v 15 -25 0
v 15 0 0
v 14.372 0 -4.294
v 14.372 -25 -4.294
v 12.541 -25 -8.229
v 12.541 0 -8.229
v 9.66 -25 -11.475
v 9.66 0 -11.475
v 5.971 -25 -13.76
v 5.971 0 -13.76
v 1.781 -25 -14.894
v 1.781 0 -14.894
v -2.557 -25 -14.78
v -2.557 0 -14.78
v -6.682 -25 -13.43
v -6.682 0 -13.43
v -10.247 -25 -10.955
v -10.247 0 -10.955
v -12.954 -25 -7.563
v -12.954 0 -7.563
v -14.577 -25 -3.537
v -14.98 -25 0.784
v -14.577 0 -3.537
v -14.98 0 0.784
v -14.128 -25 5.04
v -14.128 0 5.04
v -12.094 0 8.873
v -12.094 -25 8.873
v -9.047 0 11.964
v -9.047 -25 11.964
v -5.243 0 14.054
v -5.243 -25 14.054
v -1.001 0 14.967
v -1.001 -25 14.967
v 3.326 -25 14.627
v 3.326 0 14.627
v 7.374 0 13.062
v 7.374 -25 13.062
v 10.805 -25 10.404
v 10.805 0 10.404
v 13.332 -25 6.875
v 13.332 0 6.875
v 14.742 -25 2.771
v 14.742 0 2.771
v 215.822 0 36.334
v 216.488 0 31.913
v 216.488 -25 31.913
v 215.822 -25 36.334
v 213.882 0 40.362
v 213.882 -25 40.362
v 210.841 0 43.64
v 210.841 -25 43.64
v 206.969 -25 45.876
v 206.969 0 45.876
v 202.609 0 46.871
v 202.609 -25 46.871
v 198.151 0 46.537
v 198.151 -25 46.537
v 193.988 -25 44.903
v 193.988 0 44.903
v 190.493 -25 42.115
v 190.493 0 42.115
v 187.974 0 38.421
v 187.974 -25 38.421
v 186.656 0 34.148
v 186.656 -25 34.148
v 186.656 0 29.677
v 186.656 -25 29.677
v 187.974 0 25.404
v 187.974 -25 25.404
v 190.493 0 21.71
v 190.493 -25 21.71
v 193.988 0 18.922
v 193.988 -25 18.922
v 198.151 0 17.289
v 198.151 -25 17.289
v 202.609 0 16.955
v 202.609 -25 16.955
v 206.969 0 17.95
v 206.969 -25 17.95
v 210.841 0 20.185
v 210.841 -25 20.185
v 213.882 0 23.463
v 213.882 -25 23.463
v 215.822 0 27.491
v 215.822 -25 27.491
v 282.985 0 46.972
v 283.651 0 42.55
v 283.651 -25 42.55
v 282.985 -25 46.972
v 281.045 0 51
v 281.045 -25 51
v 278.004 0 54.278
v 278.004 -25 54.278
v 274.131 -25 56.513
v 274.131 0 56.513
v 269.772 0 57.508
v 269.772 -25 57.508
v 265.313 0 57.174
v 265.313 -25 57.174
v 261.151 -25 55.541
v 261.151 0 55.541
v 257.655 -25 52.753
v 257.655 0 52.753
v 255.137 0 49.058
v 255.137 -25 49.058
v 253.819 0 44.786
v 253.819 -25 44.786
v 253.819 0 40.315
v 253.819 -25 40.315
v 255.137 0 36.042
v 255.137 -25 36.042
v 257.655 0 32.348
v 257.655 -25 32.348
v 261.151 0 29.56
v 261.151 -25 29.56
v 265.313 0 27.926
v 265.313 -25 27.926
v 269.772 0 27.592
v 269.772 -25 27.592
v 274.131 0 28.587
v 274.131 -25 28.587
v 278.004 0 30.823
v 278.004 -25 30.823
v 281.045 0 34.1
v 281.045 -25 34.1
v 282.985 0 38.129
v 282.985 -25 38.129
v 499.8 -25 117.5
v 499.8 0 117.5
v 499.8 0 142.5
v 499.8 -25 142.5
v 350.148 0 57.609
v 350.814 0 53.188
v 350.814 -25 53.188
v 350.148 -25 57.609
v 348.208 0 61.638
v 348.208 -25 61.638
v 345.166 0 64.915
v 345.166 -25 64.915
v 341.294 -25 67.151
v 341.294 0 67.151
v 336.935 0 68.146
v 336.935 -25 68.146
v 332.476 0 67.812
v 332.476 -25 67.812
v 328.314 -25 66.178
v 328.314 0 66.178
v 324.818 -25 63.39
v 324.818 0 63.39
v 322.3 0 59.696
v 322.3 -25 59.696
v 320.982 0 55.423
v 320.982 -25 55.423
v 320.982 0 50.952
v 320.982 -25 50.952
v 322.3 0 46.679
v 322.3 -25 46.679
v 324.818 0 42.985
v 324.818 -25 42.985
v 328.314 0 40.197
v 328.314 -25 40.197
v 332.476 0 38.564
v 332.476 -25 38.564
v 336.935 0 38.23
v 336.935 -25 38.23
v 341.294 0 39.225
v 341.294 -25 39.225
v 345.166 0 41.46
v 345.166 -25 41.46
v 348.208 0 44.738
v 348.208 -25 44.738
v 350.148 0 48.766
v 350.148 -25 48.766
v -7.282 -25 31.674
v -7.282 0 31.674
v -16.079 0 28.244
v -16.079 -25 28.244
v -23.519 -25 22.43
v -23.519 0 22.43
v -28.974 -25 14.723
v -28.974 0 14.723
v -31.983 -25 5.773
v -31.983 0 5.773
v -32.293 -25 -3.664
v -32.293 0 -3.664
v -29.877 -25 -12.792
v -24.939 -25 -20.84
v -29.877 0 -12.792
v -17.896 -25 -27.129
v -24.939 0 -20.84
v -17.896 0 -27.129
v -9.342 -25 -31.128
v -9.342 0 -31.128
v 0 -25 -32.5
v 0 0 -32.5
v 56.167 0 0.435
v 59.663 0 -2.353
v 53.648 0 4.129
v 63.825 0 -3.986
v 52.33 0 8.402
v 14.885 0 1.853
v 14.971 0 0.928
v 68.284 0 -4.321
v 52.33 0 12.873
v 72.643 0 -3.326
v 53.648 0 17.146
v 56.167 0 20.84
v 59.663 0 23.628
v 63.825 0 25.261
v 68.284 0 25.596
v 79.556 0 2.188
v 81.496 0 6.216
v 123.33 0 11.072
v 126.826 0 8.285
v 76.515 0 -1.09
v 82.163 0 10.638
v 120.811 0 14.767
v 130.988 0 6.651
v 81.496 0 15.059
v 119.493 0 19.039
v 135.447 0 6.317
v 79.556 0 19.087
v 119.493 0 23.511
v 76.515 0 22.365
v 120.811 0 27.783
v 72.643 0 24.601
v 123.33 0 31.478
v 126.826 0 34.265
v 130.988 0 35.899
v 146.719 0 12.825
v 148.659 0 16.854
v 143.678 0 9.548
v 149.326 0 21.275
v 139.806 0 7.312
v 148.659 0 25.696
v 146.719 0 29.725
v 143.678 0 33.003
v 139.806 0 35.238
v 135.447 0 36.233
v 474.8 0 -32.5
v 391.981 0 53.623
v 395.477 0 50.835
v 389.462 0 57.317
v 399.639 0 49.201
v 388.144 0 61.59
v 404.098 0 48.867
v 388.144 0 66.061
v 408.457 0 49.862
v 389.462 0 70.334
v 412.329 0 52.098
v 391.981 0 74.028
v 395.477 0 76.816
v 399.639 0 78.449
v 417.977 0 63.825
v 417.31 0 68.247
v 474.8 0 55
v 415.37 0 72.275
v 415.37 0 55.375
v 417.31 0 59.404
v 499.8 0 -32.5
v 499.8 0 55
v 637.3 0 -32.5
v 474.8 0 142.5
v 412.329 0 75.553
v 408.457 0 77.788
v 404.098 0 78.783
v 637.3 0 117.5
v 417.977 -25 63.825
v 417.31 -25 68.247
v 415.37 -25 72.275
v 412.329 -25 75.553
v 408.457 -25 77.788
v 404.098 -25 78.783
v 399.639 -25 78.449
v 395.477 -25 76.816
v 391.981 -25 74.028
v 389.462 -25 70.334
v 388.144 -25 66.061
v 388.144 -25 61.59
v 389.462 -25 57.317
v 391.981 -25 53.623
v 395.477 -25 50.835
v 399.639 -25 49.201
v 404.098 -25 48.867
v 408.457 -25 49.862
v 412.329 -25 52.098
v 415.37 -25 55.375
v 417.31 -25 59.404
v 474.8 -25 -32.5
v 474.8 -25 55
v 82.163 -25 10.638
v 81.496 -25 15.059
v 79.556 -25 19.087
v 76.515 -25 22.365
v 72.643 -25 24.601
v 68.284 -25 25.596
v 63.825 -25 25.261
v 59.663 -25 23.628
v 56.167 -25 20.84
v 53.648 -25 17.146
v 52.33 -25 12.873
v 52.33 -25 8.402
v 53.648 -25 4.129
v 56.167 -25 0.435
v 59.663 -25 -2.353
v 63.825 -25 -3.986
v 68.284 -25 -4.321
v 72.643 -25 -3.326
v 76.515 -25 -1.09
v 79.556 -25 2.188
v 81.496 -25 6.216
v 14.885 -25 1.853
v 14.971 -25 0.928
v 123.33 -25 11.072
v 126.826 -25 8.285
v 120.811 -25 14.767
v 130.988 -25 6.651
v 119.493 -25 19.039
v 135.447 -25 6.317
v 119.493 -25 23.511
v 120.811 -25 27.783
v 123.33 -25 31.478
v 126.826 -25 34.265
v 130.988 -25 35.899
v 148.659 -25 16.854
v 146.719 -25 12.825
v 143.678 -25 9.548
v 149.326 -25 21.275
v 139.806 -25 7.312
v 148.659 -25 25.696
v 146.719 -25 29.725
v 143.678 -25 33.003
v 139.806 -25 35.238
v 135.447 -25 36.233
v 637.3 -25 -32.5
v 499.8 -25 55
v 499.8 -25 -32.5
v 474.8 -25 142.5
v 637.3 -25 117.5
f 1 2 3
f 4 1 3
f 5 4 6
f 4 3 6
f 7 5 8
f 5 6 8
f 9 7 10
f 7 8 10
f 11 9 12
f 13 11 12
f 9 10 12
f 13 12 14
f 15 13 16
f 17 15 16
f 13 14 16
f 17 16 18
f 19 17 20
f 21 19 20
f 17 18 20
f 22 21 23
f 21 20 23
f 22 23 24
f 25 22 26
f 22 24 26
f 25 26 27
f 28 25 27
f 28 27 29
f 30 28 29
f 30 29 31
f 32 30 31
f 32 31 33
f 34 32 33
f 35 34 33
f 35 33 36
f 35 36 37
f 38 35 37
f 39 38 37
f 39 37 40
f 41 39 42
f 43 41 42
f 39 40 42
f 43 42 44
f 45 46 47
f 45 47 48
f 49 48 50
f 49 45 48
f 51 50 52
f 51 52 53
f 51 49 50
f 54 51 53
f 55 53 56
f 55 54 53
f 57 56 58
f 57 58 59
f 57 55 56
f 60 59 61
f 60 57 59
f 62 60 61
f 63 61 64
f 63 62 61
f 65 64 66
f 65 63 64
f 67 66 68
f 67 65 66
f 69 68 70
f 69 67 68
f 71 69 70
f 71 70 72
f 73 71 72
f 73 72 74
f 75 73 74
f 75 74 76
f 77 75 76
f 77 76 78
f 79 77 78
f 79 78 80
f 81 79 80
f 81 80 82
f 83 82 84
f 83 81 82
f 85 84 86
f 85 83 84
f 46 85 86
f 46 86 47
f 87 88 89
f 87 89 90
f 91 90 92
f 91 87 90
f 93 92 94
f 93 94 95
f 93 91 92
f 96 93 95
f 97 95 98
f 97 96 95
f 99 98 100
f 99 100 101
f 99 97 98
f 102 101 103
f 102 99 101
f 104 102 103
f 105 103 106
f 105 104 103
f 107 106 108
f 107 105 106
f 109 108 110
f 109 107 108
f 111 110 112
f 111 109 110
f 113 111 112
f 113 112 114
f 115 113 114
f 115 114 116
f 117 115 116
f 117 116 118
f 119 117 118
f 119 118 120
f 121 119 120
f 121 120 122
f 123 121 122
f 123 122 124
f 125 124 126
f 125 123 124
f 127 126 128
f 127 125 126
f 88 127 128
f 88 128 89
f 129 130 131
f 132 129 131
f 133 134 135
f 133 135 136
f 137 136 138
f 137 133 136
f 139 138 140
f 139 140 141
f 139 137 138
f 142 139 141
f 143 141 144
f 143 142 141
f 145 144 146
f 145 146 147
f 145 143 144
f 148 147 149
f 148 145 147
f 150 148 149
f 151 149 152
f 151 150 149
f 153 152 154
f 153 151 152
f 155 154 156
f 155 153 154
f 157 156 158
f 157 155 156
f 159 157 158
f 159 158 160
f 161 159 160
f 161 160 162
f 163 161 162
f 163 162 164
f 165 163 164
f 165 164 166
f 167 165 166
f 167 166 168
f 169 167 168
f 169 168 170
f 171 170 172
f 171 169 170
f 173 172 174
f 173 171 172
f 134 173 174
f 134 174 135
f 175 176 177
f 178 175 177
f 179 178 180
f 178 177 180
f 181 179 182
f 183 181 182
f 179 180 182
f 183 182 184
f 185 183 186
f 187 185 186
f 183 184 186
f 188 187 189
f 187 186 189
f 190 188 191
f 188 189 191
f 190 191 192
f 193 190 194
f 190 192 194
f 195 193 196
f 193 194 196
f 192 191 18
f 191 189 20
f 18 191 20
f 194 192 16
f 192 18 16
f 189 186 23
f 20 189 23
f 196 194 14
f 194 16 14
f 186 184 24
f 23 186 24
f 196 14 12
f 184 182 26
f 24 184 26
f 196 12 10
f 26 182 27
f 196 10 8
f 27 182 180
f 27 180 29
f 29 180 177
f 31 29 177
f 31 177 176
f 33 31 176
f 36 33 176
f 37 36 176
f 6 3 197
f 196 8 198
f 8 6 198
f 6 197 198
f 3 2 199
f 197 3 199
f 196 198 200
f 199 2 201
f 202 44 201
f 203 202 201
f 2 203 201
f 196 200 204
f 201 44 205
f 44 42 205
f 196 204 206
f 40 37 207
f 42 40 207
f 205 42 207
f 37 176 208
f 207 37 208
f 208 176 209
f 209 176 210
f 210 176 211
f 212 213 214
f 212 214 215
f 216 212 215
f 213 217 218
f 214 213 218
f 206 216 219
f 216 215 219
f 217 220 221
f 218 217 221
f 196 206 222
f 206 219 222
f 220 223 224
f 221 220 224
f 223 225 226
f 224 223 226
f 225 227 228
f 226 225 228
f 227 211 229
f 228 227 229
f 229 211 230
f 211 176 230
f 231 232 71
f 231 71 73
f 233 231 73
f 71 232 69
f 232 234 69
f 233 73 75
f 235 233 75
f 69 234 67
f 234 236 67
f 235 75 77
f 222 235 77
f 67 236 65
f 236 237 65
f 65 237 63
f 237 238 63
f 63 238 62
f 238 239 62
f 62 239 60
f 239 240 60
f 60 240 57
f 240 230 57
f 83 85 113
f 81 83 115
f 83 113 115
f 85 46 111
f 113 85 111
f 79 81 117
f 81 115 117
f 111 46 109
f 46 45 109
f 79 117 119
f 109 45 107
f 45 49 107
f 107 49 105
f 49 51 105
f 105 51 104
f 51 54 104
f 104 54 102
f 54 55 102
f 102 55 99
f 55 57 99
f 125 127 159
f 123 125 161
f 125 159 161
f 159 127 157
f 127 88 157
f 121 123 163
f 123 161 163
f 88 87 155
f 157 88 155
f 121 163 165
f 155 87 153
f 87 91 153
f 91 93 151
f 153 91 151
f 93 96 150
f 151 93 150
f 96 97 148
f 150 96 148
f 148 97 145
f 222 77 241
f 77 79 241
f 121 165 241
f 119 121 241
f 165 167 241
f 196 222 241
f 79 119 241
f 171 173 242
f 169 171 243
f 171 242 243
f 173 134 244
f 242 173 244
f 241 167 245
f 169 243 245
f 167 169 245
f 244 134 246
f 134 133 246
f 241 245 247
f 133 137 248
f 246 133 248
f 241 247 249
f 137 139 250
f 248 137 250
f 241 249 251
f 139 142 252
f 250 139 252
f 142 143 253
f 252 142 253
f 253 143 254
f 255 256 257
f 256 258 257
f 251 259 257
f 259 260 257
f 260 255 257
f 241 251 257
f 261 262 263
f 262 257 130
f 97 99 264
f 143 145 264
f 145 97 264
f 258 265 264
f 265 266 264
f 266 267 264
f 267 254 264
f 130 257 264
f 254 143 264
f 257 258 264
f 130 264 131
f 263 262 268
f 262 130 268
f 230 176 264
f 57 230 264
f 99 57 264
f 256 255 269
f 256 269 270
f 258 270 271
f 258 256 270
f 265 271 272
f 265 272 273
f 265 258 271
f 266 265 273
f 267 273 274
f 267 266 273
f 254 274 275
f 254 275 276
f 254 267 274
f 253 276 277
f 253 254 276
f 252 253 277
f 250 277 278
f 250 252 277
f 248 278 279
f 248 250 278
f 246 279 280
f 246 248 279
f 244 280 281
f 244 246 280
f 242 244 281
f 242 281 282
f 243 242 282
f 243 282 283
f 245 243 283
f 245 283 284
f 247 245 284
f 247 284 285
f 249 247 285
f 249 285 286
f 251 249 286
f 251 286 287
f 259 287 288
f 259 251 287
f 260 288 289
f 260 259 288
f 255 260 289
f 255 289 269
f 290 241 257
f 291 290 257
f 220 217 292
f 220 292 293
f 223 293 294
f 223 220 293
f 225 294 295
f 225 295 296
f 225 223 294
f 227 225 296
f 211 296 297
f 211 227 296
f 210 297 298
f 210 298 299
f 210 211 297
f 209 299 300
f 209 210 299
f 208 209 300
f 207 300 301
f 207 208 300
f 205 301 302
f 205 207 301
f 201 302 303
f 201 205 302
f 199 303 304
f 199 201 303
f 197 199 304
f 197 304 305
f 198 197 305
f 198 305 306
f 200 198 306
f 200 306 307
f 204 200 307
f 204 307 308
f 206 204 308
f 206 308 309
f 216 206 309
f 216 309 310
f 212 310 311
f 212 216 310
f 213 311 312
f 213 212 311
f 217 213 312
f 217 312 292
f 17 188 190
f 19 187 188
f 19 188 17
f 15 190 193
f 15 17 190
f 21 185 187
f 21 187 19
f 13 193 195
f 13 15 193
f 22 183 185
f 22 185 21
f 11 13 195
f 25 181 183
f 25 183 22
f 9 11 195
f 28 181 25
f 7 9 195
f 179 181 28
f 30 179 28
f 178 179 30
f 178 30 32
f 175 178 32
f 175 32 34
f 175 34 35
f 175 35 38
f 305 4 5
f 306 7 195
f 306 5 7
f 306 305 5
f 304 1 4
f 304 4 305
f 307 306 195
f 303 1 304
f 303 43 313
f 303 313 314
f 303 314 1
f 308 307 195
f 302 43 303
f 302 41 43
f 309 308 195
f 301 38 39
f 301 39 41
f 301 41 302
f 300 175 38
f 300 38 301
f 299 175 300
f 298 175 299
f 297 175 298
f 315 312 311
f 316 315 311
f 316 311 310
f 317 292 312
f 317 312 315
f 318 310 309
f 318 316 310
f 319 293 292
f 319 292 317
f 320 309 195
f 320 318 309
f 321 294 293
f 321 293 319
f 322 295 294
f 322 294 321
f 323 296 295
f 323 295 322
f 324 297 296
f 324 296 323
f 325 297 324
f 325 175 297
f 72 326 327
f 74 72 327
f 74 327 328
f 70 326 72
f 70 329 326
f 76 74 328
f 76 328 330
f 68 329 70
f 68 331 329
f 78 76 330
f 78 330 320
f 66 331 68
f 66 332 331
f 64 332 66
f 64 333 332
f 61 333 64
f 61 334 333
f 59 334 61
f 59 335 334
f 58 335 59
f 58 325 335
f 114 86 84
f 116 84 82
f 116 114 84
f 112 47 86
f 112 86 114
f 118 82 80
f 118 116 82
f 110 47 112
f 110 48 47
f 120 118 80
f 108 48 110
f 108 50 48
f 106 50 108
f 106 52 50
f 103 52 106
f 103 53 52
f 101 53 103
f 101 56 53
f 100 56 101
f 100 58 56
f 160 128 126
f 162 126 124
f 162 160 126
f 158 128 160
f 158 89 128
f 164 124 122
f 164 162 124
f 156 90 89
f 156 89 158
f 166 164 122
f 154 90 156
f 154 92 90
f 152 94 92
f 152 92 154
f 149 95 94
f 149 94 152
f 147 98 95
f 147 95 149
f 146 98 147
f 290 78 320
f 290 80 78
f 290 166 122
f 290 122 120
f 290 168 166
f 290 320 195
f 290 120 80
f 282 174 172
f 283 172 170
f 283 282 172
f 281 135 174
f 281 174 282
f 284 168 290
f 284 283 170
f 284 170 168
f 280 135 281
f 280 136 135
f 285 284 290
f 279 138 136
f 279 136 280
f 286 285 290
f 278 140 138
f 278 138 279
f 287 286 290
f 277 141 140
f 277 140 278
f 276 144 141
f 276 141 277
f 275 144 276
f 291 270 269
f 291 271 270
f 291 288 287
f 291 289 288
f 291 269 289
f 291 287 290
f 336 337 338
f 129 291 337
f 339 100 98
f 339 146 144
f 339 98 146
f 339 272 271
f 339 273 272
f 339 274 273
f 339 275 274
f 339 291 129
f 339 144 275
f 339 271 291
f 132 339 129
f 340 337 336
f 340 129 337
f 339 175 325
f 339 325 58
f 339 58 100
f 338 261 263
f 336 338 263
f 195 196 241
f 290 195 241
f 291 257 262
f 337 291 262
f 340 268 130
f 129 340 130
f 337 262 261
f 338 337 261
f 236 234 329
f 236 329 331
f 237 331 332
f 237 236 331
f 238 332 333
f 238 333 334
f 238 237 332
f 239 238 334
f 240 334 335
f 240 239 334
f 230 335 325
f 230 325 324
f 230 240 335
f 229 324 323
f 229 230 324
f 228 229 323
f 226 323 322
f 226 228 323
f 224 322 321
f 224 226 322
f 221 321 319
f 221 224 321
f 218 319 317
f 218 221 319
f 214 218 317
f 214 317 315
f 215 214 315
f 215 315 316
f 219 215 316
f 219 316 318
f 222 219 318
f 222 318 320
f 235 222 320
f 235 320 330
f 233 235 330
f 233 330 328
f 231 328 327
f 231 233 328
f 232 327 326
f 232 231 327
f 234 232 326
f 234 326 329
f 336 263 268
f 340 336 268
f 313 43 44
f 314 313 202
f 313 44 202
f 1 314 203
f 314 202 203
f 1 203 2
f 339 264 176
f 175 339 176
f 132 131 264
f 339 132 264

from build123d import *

# Parameters (mm, degrees)
F0_R     = 15
F1_DEPTH = 25


with BuildPart() as f1:
    # F0 (on Front) → F1 (new body)
    with BuildSketch(Plane.XZ):
        with BuildLine():
            Line((474.8, 142.5), (-7.281521, 31.673798))
            ThreePointArc((-7.281521, 31.673798), (-32.292789, -3.664122), (0, -32.5))
            Line((0, -32.5), (474.8, -32.5))
            Line((474.8, -32.5), (474.8, 55))
            Line((474.8, 55), (499.8, 55))
            Line((499.8, 55), (499.8, -32.5))
            Line((499.8, -32.5), (637.3, -32.5))
            Line((637.3, -32.5), (637.3, 117.5))
            Line((637.3, 117.5), (499.8, 117.5))
            Line((499.8, 117.5), (499.8, 142.5))
            Line((499.8, 142.5), (474.8, 142.5))
        make_face()
        with BuildLine():
            ThreePointArc((14.741868, 2.770801), (14.935328, 1.391399), (15, 0))
            ThreePointArc((15, 0), (-14.935328, -1.391399), (14.741868, 2.770801))
        make_face(mode=Mode.SUBTRACT)
        with Locations((67.162807, 10.637544)):
            Circle(F0_R, mode=Mode.SUBTRACT)
        with Locations((134.325614, 21.275087)):
            Circle(F0_R, mode=Mode.SUBTRACT)
        with Locations((201.488421, 31.912631)):
            Circle(F0_R, mode=Mode.SUBTRACT)
        with Locations((268.651229, 42.550174)):
            Circle(F0_R, mode=Mode.SUBTRACT)
        with Locations((335.814036, 53.187718)):
            Circle(F0_R, mode=Mode.SUBTRACT)
        with Locations((402.976843, 63.825262)):
            Circle(F0_R, mode=Mode.SUBTRACT)
    extrude(amount=F1_DEPTH)


solid = f1.part
